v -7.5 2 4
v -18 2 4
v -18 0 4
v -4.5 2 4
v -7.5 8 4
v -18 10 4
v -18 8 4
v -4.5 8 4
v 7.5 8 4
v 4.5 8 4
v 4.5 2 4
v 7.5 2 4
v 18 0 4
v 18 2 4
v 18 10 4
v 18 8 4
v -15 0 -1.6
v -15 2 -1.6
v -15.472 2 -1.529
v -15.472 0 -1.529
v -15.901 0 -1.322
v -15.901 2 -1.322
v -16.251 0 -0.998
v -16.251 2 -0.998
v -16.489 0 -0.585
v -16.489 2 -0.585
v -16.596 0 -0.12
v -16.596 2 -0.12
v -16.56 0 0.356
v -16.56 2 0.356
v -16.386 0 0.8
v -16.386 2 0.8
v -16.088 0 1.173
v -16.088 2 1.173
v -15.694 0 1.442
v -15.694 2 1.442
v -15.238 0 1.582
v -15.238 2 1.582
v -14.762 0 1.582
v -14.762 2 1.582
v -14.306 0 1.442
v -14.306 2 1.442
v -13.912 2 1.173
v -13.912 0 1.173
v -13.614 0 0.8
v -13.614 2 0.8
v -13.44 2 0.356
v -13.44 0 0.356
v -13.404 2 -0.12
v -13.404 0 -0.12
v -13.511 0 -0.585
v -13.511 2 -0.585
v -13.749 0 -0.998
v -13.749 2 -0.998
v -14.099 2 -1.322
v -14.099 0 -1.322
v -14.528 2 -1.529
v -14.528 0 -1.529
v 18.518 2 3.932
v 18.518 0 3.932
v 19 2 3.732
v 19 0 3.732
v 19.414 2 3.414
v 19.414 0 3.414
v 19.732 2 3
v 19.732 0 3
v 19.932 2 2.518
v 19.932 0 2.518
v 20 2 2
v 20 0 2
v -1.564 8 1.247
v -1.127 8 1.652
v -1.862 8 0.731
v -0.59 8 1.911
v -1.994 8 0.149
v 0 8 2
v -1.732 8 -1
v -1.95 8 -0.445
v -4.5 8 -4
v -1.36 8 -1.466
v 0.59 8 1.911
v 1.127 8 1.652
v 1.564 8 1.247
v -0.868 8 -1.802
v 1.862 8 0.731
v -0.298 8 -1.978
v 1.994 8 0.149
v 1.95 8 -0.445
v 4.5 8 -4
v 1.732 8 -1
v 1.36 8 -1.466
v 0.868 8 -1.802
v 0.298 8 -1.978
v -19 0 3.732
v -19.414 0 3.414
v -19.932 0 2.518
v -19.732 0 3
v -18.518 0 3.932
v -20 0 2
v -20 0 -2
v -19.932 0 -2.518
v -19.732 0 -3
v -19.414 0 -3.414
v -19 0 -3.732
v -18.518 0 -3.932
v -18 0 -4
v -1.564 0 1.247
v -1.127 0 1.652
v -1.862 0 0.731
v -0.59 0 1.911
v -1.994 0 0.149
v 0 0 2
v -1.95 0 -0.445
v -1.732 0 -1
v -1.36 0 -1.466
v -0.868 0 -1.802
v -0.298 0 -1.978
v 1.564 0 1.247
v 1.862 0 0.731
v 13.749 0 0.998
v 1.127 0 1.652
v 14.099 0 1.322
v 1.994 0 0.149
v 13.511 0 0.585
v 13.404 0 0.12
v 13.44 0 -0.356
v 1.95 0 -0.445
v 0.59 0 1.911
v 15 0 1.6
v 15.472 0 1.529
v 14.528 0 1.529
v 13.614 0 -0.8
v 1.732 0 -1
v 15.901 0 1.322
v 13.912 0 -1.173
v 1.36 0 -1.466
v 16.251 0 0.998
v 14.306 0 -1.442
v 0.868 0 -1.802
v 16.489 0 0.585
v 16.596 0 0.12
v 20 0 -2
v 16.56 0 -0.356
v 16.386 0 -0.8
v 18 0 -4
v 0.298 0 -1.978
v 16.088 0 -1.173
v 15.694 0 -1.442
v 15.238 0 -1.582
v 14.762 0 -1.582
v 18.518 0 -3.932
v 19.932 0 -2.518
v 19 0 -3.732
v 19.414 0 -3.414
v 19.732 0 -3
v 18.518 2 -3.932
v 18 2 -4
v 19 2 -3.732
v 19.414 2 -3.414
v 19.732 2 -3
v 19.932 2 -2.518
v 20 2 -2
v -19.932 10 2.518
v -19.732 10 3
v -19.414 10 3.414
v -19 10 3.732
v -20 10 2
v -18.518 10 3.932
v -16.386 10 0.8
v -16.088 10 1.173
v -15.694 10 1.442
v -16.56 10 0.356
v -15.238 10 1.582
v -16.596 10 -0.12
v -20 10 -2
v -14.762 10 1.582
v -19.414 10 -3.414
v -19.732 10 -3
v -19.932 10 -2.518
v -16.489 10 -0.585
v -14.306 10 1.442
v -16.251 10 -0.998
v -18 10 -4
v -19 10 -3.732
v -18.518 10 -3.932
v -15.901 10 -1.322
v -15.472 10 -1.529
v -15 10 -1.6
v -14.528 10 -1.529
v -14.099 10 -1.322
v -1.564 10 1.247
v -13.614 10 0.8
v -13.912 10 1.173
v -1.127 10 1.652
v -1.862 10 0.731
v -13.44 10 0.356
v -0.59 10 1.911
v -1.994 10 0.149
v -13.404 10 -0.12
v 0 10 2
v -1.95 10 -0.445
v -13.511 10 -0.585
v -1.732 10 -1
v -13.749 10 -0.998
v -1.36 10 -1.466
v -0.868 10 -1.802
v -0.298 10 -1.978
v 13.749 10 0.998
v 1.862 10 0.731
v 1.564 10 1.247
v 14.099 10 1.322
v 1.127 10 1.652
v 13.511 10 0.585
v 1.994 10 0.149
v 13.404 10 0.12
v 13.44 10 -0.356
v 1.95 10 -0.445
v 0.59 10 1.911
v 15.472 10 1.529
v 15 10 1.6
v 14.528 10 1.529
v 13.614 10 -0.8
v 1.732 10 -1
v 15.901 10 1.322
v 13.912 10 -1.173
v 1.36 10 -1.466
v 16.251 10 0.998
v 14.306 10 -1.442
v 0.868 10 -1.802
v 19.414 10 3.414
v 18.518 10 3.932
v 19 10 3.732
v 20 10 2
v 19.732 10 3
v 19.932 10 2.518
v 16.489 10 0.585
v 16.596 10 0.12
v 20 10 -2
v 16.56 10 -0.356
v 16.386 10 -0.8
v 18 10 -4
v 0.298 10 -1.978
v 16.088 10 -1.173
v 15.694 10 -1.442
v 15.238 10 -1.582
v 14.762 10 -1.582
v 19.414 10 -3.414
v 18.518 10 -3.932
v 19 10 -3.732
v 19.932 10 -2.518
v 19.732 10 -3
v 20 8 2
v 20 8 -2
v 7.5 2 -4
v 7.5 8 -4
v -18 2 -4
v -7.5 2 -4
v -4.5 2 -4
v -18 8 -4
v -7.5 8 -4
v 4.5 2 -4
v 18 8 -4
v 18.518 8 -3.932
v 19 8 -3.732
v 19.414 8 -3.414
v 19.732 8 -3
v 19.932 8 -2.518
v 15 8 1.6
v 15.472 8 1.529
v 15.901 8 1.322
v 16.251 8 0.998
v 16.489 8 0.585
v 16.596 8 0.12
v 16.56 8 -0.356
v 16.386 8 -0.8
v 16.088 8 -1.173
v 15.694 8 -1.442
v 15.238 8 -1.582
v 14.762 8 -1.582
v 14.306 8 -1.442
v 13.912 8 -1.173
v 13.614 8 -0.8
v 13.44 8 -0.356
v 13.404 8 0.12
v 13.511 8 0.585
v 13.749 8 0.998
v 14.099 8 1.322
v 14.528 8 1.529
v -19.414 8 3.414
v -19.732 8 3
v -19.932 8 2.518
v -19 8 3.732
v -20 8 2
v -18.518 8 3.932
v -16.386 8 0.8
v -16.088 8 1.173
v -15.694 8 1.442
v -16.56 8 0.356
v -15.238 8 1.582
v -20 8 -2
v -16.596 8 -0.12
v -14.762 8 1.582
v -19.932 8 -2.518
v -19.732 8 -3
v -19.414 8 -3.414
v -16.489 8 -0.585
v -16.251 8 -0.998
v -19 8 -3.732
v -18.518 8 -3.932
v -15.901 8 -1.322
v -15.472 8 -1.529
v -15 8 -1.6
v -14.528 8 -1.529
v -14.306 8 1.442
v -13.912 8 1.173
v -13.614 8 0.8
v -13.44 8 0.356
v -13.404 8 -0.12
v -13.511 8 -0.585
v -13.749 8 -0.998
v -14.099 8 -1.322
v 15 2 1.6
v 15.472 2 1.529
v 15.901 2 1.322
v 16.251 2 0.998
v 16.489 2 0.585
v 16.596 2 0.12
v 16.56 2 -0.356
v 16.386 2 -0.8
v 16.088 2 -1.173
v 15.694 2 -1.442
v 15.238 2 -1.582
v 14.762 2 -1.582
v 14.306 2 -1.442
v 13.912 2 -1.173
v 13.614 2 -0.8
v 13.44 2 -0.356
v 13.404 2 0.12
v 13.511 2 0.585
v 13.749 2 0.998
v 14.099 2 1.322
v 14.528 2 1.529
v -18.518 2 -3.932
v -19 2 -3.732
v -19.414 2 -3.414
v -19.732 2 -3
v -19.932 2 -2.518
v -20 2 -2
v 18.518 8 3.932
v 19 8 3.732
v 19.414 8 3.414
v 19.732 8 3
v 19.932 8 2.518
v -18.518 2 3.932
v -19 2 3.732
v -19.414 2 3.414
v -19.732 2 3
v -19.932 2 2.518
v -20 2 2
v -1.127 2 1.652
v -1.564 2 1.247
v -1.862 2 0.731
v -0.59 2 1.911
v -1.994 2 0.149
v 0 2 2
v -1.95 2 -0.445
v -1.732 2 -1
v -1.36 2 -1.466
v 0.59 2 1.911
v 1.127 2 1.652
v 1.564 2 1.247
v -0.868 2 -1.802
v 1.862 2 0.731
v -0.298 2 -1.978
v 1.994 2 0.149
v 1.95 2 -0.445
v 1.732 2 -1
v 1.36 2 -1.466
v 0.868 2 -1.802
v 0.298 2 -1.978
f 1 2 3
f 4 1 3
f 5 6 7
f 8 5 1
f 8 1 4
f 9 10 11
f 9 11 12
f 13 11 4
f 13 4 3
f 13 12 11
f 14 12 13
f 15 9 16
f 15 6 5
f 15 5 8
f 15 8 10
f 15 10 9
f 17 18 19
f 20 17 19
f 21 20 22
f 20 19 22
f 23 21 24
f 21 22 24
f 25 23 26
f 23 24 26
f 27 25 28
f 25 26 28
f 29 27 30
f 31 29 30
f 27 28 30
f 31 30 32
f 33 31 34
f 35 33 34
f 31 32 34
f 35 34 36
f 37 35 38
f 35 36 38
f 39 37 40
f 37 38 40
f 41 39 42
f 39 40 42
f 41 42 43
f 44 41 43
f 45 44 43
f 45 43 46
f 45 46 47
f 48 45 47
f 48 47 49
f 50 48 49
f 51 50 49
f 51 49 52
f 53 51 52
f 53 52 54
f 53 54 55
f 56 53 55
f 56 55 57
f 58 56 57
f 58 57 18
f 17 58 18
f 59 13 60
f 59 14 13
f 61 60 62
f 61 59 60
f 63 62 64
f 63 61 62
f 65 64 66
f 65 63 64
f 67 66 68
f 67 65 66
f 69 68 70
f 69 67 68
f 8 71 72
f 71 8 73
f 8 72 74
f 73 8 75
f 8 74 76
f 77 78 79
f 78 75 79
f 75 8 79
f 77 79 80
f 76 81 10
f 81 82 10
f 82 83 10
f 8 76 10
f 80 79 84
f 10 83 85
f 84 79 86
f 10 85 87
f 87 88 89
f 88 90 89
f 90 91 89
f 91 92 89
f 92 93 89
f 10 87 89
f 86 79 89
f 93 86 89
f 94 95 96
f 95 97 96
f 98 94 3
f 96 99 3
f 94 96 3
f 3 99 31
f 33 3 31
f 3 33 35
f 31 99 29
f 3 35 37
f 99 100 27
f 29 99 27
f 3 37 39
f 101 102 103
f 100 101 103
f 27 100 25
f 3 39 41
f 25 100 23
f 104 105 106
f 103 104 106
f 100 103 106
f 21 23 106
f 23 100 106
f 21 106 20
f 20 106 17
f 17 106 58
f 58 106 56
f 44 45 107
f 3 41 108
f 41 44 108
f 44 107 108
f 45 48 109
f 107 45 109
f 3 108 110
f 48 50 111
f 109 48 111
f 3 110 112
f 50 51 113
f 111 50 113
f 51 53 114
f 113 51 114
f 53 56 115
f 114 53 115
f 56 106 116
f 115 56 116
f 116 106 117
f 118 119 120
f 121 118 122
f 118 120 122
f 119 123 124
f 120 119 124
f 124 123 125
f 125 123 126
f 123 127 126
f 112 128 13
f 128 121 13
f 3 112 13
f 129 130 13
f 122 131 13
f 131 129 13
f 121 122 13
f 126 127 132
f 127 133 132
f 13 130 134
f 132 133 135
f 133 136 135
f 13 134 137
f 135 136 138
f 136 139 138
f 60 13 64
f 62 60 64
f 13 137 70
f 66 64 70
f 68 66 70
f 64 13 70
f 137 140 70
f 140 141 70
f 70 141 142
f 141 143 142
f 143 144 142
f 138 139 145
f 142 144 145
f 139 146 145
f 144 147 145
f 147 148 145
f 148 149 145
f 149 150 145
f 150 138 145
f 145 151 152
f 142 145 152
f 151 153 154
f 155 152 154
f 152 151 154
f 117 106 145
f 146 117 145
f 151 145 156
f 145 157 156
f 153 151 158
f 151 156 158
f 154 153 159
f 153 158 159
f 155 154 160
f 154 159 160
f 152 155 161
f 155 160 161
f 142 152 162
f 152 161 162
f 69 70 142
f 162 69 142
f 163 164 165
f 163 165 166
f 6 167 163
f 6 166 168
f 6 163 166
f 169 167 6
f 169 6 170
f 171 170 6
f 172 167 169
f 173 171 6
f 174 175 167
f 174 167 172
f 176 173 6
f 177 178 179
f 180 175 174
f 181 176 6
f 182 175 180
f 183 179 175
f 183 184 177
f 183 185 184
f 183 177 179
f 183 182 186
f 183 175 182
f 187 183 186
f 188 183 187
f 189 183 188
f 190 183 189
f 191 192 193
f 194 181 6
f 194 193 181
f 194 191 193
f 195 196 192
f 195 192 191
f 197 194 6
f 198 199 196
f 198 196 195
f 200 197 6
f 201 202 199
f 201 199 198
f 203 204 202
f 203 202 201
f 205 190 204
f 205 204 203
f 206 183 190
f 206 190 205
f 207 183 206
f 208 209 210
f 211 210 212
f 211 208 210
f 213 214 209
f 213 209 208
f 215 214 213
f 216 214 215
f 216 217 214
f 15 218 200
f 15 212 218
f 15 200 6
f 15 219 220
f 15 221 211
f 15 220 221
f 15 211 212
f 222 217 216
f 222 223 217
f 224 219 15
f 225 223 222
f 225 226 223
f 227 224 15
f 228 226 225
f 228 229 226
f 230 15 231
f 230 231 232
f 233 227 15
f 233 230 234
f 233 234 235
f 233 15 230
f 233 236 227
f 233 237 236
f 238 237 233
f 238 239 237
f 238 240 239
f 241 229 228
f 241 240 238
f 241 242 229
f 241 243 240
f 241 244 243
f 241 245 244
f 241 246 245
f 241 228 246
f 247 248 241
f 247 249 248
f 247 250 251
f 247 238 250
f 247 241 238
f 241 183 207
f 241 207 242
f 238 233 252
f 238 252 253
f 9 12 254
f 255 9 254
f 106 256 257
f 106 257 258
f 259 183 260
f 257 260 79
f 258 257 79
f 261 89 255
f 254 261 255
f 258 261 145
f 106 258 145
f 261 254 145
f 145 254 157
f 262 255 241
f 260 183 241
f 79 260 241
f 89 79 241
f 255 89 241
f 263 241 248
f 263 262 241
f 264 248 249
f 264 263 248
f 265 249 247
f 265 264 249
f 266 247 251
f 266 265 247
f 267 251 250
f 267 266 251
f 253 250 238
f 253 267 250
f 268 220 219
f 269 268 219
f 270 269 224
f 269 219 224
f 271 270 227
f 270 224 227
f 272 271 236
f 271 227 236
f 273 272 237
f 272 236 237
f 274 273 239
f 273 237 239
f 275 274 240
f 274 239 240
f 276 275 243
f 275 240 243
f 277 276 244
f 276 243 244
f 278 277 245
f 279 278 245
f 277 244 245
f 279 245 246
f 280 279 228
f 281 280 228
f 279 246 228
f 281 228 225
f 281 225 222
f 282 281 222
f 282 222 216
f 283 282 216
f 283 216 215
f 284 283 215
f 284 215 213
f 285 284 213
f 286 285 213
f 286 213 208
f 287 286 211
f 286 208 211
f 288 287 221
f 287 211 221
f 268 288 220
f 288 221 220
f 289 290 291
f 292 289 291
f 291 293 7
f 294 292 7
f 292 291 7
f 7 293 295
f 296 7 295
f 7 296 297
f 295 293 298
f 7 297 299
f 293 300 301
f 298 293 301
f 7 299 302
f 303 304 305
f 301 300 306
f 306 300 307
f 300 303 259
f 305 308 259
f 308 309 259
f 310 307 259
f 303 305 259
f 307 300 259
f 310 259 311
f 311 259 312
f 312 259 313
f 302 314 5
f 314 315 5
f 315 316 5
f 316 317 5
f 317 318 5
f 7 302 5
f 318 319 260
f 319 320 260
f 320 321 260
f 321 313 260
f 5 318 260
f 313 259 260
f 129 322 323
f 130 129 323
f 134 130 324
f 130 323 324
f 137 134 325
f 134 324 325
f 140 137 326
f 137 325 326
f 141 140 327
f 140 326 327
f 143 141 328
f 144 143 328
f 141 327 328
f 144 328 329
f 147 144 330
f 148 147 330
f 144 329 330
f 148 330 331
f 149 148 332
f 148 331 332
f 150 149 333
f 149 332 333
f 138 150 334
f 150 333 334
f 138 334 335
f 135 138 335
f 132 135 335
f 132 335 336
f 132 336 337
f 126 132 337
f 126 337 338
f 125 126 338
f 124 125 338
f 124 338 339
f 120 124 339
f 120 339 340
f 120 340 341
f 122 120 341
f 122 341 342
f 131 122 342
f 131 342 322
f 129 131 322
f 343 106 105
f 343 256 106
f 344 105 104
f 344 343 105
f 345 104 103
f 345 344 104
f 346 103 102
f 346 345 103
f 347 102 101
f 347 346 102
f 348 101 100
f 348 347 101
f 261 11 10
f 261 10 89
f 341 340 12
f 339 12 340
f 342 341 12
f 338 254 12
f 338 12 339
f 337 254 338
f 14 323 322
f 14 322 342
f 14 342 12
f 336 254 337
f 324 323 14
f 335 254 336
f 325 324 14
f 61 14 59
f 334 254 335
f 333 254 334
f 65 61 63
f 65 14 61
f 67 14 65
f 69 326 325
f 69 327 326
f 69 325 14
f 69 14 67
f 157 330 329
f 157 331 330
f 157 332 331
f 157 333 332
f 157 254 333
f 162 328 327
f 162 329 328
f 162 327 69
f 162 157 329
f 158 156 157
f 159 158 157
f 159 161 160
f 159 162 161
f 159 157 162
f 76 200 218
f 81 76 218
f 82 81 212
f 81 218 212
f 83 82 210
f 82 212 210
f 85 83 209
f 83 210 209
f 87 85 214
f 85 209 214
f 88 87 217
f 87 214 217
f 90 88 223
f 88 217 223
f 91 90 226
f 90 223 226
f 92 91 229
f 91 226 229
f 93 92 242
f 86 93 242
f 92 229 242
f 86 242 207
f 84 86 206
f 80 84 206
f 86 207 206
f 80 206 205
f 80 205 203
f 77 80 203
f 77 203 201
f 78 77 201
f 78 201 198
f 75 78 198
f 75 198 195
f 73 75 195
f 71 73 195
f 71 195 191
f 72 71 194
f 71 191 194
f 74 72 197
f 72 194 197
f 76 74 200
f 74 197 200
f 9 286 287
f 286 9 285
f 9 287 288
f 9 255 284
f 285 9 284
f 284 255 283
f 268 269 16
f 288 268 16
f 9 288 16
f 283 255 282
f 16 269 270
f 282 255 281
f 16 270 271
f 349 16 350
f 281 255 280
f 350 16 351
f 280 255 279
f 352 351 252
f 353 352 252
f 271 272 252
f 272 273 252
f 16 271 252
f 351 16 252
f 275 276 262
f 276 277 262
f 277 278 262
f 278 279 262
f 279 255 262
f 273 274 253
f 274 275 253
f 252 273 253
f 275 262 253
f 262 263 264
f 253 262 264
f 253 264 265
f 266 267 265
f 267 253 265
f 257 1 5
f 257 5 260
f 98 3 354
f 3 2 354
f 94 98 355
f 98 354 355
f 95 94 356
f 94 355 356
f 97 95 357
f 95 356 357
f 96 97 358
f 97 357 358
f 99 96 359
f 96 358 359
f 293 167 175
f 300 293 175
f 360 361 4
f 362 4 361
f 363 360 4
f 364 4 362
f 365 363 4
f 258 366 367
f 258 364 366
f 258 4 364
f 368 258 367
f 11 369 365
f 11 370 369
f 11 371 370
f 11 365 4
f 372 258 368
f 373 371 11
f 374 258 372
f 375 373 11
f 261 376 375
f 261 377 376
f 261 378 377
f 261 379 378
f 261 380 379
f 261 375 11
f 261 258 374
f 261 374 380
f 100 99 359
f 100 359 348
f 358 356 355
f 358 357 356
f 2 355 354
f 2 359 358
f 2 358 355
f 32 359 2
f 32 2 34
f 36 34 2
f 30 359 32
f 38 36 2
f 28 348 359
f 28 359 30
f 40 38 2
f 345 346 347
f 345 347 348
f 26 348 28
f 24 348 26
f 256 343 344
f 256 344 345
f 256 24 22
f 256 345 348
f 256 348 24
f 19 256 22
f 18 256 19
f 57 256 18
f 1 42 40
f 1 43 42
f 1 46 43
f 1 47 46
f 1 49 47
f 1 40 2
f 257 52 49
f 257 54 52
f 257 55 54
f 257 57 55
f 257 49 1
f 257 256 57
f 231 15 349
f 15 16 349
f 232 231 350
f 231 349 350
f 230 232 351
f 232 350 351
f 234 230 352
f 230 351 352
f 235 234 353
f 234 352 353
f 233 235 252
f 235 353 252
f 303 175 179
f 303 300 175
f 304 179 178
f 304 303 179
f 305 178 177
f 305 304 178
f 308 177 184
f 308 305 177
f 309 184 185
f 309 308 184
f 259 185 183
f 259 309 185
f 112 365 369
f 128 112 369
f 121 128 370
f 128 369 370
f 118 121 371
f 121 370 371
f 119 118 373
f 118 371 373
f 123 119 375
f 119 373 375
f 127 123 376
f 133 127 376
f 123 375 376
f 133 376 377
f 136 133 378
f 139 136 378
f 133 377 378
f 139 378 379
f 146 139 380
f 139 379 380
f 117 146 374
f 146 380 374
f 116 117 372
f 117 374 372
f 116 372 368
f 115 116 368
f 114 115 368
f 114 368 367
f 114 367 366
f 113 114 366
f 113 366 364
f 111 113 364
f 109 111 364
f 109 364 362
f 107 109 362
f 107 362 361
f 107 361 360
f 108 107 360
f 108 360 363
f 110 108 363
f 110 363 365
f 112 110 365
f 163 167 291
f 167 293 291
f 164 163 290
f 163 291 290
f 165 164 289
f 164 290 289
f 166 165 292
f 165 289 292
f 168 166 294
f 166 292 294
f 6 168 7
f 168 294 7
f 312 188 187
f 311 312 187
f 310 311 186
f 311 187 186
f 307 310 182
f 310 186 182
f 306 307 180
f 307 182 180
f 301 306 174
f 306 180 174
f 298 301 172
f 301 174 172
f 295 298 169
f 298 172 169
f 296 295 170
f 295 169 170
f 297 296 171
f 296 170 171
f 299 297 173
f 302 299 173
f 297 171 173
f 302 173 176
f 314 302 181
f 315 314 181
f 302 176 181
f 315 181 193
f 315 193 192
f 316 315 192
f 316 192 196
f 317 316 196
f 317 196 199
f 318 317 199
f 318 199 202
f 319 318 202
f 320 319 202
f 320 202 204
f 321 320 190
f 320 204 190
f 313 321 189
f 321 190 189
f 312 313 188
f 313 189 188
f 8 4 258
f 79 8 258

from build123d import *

# Parameters (mm, degrees)
SKETCH_1_W          = 40
SKETCH_1_H          = 8
EXTRUDE_1_DEPTH     = 2
CUT_EXTRUDE_1_REACH = 22.494
SKETCH_2_R          = 2
CUT_EXTRUDE_2_REACH = 22.494
SKETCH_3_R          = 1.6
SKETCH_4_W          = 3
SKETCH_4_H          = 8
EXTRUDE_2_DEPTH     = 6
EXTRUDE_START       = 2
SKETCH_5_W          = 40
SKETCH_5_H          = 8
SKETCH_5_R          = 1.6
SKETCH_5_R_2        = 2
EXTRUDE_3_DEPTH     = 2
FILLET_1_R          = 2


with BuildPart() as part:
    # 草图1 → 凸台-拉伸1 (new body)
    with BuildSketch(Plane(origin=(0, 0, 0), x_dir=(1, 0, 0), z_dir=(0, 1, 0))):
        Rectangle(SKETCH_1_W, SKETCH_1_H)
    extrude(amount=EXTRUDE_1_DEPTH)

    # 草图2 → 切除-拉伸1 (cut, up to next)
    with BuildSketch(Plane(origin=(0, 2, 0), x_dir=(1, 0, 0), z_dir=(0, 1, 0)), mode=Mode.PRIVATE) as cut_extrude_1_sk1:
        with Locations(Location((0, 0, 0), (0, 0, 270))):
            Circle(SKETCH_2_R)
    cut_extrude_1_tool1 = extrude(cut_extrude_1_sk1.sketch, amount=-CUT_EXTRUDE_1_REACH, mode=Mode.PRIVATE) & part.part
    add(cut_extrude_1_tool1.solids().sort_by_distance((0, 2, 0))[0], mode=Mode.SUBTRACT)

    # 草图3 → 切除-拉伸2 (cut, up to next)
    with BuildSketch(Plane(origin=(0, 2, 0), x_dir=(1, 0, 0), z_dir=(0, 1, 0)), mode=Mode.PRIVATE) as cut_extrude_2_sk1:
        with Locations(Location((15, 0, 0), (0, 0, 270))):
            Circle(SKETCH_3_R)
    cut_extrude_2_tool1 = extrude(cut_extrude_2_sk1.sketch, amount=-CUT_EXTRUDE_2_REACH, mode=Mode.PRIVATE) & part.part
    # 草图3 → 切除-拉伸2 (cut, up to next)
    with BuildSketch(Plane(origin=(0, 2, 0), x_dir=(1, 0, 0), z_dir=(0, 1, 0)), mode=Mode.PRIVATE) as cut_extrude_2_sk2:
        with Locations(Location((-15, 0, 0), (0, 0, 90))):
            Circle(SKETCH_3_R)
    cut_extrude_2_tool2 = extrude(cut_extrude_2_sk2.sketch, amount=-CUT_EXTRUDE_2_REACH, mode=Mode.PRIVATE) & part.part
    add(cut_extrude_2_tool1.solids().sort_by_distance((15, 2, 0))[0], mode=Mode.SUBTRACT)
    add(cut_extrude_2_tool2.solids().sort_by_distance((-15, 2, 0))[0], mode=Mode.SUBTRACT)

    # 草图4 → 凸台-拉伸2 (add)
    with BuildSketch(Plane(origin=(0, 2, 0), x_dir=(1, 0, 0), z_dir=(0, 1, 0))):
        with Locations((-6, 0)):
            Rectangle(SKETCH_4_W, SKETCH_4_H)
        with Locations((6, 0)):
            Rectangle(SKETCH_4_W, SKETCH_4_H)
    extrude(amount=EXTRUDE_2_DEPTH)

    # 草图5 → 凸台-拉伸3 (add)
    with BuildSketch(Plane(origin=(0, 8, 0), x_dir=(1, 0, 0), z_dir=(0, 1, 0)).offset(EXTRUDE_START)):
        Rectangle(SKETCH_5_W, SKETCH_5_H)
        with Locations(Location((15, 0, 0), (0, 0, 270))):
            Circle(SKETCH_5_R, mode=Mode.SUBTRACT)
        with Locations(Location((0, 0, 0), (0, 0, 270))):
            Circle(SKETCH_5_R_2, mode=Mode.SUBTRACT)
        with Locations(Location((-15, 0, 0), (0, 0, 90))):
            Circle(SKETCH_5_R, mode=Mode.SUBTRACT)
    extrude(amount=-EXTRUDE_3_DEPTH)

    # 圆角1
    fillet_1_edges = [part.edges().sort_by_distance(p)[0] for p in [
        (20, 9, 4),
        (20, 9, -4),
        (-20, 9, -4),
        (-20, 9, 4),
        (20, 1, 4),
        (-20, 1, 4),
        (-20, 1, -4),
        (20, 1, -4),
    ]]
    fillet(fillet_1_edges, radius=FILLET_1_R)


solid = part.part
